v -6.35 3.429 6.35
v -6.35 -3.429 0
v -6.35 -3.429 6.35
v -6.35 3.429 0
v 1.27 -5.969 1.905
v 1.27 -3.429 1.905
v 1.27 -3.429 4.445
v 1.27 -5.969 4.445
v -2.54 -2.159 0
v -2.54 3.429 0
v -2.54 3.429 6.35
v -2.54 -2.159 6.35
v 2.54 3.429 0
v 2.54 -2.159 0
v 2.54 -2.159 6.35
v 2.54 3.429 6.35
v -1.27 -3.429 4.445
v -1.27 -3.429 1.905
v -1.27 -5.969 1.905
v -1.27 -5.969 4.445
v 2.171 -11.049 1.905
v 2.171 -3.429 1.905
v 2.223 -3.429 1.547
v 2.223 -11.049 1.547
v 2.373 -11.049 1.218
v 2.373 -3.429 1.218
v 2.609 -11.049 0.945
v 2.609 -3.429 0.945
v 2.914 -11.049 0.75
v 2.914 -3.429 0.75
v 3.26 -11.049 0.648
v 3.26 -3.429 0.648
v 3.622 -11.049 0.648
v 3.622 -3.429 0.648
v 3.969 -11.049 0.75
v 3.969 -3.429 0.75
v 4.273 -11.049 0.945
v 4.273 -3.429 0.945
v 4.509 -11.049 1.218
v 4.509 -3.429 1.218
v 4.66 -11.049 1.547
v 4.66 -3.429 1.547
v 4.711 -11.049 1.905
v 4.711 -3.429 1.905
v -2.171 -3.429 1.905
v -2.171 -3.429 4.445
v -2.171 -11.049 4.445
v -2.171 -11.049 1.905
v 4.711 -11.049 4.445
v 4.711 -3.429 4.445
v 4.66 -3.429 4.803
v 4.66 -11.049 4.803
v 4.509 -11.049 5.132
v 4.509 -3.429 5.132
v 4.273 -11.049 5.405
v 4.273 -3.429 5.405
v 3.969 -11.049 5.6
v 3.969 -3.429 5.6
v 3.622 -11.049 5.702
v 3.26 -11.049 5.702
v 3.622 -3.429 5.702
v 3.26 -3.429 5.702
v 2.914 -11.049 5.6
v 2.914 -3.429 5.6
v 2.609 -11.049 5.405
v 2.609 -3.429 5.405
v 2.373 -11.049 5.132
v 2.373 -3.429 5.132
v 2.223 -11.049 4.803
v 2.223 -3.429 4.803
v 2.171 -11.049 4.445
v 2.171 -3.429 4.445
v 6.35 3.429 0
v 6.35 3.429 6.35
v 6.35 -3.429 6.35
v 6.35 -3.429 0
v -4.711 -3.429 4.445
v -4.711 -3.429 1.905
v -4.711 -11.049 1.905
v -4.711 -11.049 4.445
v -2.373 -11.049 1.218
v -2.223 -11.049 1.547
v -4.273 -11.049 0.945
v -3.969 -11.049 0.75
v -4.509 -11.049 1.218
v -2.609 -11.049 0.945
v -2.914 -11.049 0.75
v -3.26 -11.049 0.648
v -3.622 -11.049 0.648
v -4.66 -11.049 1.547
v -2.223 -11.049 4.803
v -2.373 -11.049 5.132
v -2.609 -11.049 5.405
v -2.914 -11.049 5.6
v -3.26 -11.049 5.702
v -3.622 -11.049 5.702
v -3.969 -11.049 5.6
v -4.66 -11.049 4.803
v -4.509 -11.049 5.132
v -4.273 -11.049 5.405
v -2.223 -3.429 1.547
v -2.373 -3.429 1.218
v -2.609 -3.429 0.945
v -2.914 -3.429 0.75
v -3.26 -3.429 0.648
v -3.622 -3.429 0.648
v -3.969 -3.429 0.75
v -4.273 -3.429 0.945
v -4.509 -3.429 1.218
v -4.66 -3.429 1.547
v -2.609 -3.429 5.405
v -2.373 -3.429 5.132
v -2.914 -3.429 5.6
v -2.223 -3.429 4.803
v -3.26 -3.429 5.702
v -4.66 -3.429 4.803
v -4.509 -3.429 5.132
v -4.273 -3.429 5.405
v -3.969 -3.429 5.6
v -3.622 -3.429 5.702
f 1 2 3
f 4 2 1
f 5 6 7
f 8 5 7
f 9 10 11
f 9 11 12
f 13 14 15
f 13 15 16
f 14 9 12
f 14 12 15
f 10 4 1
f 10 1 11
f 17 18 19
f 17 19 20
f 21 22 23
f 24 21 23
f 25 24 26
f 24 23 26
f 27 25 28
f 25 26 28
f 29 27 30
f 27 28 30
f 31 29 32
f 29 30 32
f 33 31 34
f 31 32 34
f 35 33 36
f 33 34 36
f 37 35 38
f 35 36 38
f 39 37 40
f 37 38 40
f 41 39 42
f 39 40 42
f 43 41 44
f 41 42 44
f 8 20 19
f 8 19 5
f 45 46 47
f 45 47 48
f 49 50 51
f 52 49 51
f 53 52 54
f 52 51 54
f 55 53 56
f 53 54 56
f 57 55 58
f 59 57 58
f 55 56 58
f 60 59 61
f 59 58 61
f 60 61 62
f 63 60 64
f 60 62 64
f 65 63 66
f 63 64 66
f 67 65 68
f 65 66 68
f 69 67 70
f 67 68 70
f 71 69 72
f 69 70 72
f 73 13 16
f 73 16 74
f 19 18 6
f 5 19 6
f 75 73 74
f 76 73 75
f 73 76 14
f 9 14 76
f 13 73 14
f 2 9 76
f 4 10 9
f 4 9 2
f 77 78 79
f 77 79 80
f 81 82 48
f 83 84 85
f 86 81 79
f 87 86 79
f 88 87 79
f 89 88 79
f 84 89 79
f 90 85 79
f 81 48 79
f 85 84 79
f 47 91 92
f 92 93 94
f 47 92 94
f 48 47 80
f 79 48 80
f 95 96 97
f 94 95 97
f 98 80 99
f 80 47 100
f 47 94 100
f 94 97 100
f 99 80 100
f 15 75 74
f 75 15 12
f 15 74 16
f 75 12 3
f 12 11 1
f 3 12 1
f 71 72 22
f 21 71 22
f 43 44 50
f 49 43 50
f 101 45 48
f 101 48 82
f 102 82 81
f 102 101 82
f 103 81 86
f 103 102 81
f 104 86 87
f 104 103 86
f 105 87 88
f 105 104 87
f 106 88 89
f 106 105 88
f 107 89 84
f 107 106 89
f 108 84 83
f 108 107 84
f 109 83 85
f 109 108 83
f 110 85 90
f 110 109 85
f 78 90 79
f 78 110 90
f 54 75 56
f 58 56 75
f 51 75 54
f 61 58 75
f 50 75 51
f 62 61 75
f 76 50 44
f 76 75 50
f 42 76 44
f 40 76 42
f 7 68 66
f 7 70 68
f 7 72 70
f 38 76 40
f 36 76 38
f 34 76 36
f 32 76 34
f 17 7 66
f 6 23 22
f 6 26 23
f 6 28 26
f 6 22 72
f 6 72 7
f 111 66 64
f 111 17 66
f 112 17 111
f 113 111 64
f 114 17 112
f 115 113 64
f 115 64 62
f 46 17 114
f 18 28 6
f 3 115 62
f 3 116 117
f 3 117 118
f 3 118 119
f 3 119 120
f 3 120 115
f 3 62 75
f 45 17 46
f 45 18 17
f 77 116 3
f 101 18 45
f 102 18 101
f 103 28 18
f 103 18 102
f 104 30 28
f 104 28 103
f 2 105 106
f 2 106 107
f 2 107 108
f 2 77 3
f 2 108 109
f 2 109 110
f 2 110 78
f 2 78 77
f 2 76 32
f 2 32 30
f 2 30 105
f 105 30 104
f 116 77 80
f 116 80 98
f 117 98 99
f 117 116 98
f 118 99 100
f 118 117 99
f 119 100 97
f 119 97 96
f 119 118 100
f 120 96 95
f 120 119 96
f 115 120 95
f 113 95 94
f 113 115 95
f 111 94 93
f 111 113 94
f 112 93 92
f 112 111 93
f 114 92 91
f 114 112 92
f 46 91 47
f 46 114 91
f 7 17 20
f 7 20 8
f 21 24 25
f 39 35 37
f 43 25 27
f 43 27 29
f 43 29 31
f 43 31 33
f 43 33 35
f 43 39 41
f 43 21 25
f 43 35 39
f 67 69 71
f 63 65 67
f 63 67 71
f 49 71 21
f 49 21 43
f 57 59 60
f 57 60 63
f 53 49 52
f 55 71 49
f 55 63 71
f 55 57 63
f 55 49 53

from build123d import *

# Parameters (mm, degrees)
BOSS_EXTRUDE1_DEPTH = 6.35
SKETCH2_W           = 2.54
SKETCH2_H           = 2.54
BOSS_EXTRUDE2_DEPTH = 2.54
BOSS_EXTRUDE3_DEPTH = 7.62


with BuildPart() as part:
    # Sketch1 → Boss-Extrude1 (new body)
    with BuildSketch(Plane.XY):
        Polygon((6.35, -3.429), (-6.35, -3.429), (-6.35, 3.429), (-2.54, 3.429), (-2.54, -2.159), (2.54, -2.159), (2.54, 3.429), (6.35, 3.429), align=None)
    extrude(amount=BOSS_EXTRUDE1_DEPTH)

    # Sketch2 → Boss-Extrude2 (add)
    with BuildSketch(Plane.XZ.offset(3.429)):
        with Locations((0, 3.175)):
            Rectangle(SKETCH2_W, SKETCH2_H)
    extrude(amount=BOSS_EXTRUDE2_DEPTH)

    # Sketch3 → Boss-Extrude3 (add)
    with BuildSketch(Plane.XZ.offset(3.429)):
        with BuildLine():
            Line((-4.711095298, 1.905), (-4.711095298, 4.445))
            ThreePointArc((-4.711095298, 4.445), (-3.441095298, 5.715), (-2.171095298, 4.445))
            Line((-2.171095298, 4.445), (-2.171095298, 1.905))
            ThreePointArc((-2.171095298, 1.905), (-3.441095298, 0.635), (-4.711095298, 1.905))
        make_face()
        with BuildLine():
            Line((4.711095298, 1.905), (4.711095298, 4.445))
            ThreePointArc((4.711095298, 4.445), (3.441095298, 5.715), (2.171095298, 4.445))
            Line((2.171095298, 4.445), (2.171095298, 1.905))
            ThreePointArc((2.171095298, 1.905), (3.441095298, 0.635), (4.711095298, 1.905))
        make_face()
    extrude(amount=BOSS_EXTRUDE3_DEPTH)


solid = part.part
